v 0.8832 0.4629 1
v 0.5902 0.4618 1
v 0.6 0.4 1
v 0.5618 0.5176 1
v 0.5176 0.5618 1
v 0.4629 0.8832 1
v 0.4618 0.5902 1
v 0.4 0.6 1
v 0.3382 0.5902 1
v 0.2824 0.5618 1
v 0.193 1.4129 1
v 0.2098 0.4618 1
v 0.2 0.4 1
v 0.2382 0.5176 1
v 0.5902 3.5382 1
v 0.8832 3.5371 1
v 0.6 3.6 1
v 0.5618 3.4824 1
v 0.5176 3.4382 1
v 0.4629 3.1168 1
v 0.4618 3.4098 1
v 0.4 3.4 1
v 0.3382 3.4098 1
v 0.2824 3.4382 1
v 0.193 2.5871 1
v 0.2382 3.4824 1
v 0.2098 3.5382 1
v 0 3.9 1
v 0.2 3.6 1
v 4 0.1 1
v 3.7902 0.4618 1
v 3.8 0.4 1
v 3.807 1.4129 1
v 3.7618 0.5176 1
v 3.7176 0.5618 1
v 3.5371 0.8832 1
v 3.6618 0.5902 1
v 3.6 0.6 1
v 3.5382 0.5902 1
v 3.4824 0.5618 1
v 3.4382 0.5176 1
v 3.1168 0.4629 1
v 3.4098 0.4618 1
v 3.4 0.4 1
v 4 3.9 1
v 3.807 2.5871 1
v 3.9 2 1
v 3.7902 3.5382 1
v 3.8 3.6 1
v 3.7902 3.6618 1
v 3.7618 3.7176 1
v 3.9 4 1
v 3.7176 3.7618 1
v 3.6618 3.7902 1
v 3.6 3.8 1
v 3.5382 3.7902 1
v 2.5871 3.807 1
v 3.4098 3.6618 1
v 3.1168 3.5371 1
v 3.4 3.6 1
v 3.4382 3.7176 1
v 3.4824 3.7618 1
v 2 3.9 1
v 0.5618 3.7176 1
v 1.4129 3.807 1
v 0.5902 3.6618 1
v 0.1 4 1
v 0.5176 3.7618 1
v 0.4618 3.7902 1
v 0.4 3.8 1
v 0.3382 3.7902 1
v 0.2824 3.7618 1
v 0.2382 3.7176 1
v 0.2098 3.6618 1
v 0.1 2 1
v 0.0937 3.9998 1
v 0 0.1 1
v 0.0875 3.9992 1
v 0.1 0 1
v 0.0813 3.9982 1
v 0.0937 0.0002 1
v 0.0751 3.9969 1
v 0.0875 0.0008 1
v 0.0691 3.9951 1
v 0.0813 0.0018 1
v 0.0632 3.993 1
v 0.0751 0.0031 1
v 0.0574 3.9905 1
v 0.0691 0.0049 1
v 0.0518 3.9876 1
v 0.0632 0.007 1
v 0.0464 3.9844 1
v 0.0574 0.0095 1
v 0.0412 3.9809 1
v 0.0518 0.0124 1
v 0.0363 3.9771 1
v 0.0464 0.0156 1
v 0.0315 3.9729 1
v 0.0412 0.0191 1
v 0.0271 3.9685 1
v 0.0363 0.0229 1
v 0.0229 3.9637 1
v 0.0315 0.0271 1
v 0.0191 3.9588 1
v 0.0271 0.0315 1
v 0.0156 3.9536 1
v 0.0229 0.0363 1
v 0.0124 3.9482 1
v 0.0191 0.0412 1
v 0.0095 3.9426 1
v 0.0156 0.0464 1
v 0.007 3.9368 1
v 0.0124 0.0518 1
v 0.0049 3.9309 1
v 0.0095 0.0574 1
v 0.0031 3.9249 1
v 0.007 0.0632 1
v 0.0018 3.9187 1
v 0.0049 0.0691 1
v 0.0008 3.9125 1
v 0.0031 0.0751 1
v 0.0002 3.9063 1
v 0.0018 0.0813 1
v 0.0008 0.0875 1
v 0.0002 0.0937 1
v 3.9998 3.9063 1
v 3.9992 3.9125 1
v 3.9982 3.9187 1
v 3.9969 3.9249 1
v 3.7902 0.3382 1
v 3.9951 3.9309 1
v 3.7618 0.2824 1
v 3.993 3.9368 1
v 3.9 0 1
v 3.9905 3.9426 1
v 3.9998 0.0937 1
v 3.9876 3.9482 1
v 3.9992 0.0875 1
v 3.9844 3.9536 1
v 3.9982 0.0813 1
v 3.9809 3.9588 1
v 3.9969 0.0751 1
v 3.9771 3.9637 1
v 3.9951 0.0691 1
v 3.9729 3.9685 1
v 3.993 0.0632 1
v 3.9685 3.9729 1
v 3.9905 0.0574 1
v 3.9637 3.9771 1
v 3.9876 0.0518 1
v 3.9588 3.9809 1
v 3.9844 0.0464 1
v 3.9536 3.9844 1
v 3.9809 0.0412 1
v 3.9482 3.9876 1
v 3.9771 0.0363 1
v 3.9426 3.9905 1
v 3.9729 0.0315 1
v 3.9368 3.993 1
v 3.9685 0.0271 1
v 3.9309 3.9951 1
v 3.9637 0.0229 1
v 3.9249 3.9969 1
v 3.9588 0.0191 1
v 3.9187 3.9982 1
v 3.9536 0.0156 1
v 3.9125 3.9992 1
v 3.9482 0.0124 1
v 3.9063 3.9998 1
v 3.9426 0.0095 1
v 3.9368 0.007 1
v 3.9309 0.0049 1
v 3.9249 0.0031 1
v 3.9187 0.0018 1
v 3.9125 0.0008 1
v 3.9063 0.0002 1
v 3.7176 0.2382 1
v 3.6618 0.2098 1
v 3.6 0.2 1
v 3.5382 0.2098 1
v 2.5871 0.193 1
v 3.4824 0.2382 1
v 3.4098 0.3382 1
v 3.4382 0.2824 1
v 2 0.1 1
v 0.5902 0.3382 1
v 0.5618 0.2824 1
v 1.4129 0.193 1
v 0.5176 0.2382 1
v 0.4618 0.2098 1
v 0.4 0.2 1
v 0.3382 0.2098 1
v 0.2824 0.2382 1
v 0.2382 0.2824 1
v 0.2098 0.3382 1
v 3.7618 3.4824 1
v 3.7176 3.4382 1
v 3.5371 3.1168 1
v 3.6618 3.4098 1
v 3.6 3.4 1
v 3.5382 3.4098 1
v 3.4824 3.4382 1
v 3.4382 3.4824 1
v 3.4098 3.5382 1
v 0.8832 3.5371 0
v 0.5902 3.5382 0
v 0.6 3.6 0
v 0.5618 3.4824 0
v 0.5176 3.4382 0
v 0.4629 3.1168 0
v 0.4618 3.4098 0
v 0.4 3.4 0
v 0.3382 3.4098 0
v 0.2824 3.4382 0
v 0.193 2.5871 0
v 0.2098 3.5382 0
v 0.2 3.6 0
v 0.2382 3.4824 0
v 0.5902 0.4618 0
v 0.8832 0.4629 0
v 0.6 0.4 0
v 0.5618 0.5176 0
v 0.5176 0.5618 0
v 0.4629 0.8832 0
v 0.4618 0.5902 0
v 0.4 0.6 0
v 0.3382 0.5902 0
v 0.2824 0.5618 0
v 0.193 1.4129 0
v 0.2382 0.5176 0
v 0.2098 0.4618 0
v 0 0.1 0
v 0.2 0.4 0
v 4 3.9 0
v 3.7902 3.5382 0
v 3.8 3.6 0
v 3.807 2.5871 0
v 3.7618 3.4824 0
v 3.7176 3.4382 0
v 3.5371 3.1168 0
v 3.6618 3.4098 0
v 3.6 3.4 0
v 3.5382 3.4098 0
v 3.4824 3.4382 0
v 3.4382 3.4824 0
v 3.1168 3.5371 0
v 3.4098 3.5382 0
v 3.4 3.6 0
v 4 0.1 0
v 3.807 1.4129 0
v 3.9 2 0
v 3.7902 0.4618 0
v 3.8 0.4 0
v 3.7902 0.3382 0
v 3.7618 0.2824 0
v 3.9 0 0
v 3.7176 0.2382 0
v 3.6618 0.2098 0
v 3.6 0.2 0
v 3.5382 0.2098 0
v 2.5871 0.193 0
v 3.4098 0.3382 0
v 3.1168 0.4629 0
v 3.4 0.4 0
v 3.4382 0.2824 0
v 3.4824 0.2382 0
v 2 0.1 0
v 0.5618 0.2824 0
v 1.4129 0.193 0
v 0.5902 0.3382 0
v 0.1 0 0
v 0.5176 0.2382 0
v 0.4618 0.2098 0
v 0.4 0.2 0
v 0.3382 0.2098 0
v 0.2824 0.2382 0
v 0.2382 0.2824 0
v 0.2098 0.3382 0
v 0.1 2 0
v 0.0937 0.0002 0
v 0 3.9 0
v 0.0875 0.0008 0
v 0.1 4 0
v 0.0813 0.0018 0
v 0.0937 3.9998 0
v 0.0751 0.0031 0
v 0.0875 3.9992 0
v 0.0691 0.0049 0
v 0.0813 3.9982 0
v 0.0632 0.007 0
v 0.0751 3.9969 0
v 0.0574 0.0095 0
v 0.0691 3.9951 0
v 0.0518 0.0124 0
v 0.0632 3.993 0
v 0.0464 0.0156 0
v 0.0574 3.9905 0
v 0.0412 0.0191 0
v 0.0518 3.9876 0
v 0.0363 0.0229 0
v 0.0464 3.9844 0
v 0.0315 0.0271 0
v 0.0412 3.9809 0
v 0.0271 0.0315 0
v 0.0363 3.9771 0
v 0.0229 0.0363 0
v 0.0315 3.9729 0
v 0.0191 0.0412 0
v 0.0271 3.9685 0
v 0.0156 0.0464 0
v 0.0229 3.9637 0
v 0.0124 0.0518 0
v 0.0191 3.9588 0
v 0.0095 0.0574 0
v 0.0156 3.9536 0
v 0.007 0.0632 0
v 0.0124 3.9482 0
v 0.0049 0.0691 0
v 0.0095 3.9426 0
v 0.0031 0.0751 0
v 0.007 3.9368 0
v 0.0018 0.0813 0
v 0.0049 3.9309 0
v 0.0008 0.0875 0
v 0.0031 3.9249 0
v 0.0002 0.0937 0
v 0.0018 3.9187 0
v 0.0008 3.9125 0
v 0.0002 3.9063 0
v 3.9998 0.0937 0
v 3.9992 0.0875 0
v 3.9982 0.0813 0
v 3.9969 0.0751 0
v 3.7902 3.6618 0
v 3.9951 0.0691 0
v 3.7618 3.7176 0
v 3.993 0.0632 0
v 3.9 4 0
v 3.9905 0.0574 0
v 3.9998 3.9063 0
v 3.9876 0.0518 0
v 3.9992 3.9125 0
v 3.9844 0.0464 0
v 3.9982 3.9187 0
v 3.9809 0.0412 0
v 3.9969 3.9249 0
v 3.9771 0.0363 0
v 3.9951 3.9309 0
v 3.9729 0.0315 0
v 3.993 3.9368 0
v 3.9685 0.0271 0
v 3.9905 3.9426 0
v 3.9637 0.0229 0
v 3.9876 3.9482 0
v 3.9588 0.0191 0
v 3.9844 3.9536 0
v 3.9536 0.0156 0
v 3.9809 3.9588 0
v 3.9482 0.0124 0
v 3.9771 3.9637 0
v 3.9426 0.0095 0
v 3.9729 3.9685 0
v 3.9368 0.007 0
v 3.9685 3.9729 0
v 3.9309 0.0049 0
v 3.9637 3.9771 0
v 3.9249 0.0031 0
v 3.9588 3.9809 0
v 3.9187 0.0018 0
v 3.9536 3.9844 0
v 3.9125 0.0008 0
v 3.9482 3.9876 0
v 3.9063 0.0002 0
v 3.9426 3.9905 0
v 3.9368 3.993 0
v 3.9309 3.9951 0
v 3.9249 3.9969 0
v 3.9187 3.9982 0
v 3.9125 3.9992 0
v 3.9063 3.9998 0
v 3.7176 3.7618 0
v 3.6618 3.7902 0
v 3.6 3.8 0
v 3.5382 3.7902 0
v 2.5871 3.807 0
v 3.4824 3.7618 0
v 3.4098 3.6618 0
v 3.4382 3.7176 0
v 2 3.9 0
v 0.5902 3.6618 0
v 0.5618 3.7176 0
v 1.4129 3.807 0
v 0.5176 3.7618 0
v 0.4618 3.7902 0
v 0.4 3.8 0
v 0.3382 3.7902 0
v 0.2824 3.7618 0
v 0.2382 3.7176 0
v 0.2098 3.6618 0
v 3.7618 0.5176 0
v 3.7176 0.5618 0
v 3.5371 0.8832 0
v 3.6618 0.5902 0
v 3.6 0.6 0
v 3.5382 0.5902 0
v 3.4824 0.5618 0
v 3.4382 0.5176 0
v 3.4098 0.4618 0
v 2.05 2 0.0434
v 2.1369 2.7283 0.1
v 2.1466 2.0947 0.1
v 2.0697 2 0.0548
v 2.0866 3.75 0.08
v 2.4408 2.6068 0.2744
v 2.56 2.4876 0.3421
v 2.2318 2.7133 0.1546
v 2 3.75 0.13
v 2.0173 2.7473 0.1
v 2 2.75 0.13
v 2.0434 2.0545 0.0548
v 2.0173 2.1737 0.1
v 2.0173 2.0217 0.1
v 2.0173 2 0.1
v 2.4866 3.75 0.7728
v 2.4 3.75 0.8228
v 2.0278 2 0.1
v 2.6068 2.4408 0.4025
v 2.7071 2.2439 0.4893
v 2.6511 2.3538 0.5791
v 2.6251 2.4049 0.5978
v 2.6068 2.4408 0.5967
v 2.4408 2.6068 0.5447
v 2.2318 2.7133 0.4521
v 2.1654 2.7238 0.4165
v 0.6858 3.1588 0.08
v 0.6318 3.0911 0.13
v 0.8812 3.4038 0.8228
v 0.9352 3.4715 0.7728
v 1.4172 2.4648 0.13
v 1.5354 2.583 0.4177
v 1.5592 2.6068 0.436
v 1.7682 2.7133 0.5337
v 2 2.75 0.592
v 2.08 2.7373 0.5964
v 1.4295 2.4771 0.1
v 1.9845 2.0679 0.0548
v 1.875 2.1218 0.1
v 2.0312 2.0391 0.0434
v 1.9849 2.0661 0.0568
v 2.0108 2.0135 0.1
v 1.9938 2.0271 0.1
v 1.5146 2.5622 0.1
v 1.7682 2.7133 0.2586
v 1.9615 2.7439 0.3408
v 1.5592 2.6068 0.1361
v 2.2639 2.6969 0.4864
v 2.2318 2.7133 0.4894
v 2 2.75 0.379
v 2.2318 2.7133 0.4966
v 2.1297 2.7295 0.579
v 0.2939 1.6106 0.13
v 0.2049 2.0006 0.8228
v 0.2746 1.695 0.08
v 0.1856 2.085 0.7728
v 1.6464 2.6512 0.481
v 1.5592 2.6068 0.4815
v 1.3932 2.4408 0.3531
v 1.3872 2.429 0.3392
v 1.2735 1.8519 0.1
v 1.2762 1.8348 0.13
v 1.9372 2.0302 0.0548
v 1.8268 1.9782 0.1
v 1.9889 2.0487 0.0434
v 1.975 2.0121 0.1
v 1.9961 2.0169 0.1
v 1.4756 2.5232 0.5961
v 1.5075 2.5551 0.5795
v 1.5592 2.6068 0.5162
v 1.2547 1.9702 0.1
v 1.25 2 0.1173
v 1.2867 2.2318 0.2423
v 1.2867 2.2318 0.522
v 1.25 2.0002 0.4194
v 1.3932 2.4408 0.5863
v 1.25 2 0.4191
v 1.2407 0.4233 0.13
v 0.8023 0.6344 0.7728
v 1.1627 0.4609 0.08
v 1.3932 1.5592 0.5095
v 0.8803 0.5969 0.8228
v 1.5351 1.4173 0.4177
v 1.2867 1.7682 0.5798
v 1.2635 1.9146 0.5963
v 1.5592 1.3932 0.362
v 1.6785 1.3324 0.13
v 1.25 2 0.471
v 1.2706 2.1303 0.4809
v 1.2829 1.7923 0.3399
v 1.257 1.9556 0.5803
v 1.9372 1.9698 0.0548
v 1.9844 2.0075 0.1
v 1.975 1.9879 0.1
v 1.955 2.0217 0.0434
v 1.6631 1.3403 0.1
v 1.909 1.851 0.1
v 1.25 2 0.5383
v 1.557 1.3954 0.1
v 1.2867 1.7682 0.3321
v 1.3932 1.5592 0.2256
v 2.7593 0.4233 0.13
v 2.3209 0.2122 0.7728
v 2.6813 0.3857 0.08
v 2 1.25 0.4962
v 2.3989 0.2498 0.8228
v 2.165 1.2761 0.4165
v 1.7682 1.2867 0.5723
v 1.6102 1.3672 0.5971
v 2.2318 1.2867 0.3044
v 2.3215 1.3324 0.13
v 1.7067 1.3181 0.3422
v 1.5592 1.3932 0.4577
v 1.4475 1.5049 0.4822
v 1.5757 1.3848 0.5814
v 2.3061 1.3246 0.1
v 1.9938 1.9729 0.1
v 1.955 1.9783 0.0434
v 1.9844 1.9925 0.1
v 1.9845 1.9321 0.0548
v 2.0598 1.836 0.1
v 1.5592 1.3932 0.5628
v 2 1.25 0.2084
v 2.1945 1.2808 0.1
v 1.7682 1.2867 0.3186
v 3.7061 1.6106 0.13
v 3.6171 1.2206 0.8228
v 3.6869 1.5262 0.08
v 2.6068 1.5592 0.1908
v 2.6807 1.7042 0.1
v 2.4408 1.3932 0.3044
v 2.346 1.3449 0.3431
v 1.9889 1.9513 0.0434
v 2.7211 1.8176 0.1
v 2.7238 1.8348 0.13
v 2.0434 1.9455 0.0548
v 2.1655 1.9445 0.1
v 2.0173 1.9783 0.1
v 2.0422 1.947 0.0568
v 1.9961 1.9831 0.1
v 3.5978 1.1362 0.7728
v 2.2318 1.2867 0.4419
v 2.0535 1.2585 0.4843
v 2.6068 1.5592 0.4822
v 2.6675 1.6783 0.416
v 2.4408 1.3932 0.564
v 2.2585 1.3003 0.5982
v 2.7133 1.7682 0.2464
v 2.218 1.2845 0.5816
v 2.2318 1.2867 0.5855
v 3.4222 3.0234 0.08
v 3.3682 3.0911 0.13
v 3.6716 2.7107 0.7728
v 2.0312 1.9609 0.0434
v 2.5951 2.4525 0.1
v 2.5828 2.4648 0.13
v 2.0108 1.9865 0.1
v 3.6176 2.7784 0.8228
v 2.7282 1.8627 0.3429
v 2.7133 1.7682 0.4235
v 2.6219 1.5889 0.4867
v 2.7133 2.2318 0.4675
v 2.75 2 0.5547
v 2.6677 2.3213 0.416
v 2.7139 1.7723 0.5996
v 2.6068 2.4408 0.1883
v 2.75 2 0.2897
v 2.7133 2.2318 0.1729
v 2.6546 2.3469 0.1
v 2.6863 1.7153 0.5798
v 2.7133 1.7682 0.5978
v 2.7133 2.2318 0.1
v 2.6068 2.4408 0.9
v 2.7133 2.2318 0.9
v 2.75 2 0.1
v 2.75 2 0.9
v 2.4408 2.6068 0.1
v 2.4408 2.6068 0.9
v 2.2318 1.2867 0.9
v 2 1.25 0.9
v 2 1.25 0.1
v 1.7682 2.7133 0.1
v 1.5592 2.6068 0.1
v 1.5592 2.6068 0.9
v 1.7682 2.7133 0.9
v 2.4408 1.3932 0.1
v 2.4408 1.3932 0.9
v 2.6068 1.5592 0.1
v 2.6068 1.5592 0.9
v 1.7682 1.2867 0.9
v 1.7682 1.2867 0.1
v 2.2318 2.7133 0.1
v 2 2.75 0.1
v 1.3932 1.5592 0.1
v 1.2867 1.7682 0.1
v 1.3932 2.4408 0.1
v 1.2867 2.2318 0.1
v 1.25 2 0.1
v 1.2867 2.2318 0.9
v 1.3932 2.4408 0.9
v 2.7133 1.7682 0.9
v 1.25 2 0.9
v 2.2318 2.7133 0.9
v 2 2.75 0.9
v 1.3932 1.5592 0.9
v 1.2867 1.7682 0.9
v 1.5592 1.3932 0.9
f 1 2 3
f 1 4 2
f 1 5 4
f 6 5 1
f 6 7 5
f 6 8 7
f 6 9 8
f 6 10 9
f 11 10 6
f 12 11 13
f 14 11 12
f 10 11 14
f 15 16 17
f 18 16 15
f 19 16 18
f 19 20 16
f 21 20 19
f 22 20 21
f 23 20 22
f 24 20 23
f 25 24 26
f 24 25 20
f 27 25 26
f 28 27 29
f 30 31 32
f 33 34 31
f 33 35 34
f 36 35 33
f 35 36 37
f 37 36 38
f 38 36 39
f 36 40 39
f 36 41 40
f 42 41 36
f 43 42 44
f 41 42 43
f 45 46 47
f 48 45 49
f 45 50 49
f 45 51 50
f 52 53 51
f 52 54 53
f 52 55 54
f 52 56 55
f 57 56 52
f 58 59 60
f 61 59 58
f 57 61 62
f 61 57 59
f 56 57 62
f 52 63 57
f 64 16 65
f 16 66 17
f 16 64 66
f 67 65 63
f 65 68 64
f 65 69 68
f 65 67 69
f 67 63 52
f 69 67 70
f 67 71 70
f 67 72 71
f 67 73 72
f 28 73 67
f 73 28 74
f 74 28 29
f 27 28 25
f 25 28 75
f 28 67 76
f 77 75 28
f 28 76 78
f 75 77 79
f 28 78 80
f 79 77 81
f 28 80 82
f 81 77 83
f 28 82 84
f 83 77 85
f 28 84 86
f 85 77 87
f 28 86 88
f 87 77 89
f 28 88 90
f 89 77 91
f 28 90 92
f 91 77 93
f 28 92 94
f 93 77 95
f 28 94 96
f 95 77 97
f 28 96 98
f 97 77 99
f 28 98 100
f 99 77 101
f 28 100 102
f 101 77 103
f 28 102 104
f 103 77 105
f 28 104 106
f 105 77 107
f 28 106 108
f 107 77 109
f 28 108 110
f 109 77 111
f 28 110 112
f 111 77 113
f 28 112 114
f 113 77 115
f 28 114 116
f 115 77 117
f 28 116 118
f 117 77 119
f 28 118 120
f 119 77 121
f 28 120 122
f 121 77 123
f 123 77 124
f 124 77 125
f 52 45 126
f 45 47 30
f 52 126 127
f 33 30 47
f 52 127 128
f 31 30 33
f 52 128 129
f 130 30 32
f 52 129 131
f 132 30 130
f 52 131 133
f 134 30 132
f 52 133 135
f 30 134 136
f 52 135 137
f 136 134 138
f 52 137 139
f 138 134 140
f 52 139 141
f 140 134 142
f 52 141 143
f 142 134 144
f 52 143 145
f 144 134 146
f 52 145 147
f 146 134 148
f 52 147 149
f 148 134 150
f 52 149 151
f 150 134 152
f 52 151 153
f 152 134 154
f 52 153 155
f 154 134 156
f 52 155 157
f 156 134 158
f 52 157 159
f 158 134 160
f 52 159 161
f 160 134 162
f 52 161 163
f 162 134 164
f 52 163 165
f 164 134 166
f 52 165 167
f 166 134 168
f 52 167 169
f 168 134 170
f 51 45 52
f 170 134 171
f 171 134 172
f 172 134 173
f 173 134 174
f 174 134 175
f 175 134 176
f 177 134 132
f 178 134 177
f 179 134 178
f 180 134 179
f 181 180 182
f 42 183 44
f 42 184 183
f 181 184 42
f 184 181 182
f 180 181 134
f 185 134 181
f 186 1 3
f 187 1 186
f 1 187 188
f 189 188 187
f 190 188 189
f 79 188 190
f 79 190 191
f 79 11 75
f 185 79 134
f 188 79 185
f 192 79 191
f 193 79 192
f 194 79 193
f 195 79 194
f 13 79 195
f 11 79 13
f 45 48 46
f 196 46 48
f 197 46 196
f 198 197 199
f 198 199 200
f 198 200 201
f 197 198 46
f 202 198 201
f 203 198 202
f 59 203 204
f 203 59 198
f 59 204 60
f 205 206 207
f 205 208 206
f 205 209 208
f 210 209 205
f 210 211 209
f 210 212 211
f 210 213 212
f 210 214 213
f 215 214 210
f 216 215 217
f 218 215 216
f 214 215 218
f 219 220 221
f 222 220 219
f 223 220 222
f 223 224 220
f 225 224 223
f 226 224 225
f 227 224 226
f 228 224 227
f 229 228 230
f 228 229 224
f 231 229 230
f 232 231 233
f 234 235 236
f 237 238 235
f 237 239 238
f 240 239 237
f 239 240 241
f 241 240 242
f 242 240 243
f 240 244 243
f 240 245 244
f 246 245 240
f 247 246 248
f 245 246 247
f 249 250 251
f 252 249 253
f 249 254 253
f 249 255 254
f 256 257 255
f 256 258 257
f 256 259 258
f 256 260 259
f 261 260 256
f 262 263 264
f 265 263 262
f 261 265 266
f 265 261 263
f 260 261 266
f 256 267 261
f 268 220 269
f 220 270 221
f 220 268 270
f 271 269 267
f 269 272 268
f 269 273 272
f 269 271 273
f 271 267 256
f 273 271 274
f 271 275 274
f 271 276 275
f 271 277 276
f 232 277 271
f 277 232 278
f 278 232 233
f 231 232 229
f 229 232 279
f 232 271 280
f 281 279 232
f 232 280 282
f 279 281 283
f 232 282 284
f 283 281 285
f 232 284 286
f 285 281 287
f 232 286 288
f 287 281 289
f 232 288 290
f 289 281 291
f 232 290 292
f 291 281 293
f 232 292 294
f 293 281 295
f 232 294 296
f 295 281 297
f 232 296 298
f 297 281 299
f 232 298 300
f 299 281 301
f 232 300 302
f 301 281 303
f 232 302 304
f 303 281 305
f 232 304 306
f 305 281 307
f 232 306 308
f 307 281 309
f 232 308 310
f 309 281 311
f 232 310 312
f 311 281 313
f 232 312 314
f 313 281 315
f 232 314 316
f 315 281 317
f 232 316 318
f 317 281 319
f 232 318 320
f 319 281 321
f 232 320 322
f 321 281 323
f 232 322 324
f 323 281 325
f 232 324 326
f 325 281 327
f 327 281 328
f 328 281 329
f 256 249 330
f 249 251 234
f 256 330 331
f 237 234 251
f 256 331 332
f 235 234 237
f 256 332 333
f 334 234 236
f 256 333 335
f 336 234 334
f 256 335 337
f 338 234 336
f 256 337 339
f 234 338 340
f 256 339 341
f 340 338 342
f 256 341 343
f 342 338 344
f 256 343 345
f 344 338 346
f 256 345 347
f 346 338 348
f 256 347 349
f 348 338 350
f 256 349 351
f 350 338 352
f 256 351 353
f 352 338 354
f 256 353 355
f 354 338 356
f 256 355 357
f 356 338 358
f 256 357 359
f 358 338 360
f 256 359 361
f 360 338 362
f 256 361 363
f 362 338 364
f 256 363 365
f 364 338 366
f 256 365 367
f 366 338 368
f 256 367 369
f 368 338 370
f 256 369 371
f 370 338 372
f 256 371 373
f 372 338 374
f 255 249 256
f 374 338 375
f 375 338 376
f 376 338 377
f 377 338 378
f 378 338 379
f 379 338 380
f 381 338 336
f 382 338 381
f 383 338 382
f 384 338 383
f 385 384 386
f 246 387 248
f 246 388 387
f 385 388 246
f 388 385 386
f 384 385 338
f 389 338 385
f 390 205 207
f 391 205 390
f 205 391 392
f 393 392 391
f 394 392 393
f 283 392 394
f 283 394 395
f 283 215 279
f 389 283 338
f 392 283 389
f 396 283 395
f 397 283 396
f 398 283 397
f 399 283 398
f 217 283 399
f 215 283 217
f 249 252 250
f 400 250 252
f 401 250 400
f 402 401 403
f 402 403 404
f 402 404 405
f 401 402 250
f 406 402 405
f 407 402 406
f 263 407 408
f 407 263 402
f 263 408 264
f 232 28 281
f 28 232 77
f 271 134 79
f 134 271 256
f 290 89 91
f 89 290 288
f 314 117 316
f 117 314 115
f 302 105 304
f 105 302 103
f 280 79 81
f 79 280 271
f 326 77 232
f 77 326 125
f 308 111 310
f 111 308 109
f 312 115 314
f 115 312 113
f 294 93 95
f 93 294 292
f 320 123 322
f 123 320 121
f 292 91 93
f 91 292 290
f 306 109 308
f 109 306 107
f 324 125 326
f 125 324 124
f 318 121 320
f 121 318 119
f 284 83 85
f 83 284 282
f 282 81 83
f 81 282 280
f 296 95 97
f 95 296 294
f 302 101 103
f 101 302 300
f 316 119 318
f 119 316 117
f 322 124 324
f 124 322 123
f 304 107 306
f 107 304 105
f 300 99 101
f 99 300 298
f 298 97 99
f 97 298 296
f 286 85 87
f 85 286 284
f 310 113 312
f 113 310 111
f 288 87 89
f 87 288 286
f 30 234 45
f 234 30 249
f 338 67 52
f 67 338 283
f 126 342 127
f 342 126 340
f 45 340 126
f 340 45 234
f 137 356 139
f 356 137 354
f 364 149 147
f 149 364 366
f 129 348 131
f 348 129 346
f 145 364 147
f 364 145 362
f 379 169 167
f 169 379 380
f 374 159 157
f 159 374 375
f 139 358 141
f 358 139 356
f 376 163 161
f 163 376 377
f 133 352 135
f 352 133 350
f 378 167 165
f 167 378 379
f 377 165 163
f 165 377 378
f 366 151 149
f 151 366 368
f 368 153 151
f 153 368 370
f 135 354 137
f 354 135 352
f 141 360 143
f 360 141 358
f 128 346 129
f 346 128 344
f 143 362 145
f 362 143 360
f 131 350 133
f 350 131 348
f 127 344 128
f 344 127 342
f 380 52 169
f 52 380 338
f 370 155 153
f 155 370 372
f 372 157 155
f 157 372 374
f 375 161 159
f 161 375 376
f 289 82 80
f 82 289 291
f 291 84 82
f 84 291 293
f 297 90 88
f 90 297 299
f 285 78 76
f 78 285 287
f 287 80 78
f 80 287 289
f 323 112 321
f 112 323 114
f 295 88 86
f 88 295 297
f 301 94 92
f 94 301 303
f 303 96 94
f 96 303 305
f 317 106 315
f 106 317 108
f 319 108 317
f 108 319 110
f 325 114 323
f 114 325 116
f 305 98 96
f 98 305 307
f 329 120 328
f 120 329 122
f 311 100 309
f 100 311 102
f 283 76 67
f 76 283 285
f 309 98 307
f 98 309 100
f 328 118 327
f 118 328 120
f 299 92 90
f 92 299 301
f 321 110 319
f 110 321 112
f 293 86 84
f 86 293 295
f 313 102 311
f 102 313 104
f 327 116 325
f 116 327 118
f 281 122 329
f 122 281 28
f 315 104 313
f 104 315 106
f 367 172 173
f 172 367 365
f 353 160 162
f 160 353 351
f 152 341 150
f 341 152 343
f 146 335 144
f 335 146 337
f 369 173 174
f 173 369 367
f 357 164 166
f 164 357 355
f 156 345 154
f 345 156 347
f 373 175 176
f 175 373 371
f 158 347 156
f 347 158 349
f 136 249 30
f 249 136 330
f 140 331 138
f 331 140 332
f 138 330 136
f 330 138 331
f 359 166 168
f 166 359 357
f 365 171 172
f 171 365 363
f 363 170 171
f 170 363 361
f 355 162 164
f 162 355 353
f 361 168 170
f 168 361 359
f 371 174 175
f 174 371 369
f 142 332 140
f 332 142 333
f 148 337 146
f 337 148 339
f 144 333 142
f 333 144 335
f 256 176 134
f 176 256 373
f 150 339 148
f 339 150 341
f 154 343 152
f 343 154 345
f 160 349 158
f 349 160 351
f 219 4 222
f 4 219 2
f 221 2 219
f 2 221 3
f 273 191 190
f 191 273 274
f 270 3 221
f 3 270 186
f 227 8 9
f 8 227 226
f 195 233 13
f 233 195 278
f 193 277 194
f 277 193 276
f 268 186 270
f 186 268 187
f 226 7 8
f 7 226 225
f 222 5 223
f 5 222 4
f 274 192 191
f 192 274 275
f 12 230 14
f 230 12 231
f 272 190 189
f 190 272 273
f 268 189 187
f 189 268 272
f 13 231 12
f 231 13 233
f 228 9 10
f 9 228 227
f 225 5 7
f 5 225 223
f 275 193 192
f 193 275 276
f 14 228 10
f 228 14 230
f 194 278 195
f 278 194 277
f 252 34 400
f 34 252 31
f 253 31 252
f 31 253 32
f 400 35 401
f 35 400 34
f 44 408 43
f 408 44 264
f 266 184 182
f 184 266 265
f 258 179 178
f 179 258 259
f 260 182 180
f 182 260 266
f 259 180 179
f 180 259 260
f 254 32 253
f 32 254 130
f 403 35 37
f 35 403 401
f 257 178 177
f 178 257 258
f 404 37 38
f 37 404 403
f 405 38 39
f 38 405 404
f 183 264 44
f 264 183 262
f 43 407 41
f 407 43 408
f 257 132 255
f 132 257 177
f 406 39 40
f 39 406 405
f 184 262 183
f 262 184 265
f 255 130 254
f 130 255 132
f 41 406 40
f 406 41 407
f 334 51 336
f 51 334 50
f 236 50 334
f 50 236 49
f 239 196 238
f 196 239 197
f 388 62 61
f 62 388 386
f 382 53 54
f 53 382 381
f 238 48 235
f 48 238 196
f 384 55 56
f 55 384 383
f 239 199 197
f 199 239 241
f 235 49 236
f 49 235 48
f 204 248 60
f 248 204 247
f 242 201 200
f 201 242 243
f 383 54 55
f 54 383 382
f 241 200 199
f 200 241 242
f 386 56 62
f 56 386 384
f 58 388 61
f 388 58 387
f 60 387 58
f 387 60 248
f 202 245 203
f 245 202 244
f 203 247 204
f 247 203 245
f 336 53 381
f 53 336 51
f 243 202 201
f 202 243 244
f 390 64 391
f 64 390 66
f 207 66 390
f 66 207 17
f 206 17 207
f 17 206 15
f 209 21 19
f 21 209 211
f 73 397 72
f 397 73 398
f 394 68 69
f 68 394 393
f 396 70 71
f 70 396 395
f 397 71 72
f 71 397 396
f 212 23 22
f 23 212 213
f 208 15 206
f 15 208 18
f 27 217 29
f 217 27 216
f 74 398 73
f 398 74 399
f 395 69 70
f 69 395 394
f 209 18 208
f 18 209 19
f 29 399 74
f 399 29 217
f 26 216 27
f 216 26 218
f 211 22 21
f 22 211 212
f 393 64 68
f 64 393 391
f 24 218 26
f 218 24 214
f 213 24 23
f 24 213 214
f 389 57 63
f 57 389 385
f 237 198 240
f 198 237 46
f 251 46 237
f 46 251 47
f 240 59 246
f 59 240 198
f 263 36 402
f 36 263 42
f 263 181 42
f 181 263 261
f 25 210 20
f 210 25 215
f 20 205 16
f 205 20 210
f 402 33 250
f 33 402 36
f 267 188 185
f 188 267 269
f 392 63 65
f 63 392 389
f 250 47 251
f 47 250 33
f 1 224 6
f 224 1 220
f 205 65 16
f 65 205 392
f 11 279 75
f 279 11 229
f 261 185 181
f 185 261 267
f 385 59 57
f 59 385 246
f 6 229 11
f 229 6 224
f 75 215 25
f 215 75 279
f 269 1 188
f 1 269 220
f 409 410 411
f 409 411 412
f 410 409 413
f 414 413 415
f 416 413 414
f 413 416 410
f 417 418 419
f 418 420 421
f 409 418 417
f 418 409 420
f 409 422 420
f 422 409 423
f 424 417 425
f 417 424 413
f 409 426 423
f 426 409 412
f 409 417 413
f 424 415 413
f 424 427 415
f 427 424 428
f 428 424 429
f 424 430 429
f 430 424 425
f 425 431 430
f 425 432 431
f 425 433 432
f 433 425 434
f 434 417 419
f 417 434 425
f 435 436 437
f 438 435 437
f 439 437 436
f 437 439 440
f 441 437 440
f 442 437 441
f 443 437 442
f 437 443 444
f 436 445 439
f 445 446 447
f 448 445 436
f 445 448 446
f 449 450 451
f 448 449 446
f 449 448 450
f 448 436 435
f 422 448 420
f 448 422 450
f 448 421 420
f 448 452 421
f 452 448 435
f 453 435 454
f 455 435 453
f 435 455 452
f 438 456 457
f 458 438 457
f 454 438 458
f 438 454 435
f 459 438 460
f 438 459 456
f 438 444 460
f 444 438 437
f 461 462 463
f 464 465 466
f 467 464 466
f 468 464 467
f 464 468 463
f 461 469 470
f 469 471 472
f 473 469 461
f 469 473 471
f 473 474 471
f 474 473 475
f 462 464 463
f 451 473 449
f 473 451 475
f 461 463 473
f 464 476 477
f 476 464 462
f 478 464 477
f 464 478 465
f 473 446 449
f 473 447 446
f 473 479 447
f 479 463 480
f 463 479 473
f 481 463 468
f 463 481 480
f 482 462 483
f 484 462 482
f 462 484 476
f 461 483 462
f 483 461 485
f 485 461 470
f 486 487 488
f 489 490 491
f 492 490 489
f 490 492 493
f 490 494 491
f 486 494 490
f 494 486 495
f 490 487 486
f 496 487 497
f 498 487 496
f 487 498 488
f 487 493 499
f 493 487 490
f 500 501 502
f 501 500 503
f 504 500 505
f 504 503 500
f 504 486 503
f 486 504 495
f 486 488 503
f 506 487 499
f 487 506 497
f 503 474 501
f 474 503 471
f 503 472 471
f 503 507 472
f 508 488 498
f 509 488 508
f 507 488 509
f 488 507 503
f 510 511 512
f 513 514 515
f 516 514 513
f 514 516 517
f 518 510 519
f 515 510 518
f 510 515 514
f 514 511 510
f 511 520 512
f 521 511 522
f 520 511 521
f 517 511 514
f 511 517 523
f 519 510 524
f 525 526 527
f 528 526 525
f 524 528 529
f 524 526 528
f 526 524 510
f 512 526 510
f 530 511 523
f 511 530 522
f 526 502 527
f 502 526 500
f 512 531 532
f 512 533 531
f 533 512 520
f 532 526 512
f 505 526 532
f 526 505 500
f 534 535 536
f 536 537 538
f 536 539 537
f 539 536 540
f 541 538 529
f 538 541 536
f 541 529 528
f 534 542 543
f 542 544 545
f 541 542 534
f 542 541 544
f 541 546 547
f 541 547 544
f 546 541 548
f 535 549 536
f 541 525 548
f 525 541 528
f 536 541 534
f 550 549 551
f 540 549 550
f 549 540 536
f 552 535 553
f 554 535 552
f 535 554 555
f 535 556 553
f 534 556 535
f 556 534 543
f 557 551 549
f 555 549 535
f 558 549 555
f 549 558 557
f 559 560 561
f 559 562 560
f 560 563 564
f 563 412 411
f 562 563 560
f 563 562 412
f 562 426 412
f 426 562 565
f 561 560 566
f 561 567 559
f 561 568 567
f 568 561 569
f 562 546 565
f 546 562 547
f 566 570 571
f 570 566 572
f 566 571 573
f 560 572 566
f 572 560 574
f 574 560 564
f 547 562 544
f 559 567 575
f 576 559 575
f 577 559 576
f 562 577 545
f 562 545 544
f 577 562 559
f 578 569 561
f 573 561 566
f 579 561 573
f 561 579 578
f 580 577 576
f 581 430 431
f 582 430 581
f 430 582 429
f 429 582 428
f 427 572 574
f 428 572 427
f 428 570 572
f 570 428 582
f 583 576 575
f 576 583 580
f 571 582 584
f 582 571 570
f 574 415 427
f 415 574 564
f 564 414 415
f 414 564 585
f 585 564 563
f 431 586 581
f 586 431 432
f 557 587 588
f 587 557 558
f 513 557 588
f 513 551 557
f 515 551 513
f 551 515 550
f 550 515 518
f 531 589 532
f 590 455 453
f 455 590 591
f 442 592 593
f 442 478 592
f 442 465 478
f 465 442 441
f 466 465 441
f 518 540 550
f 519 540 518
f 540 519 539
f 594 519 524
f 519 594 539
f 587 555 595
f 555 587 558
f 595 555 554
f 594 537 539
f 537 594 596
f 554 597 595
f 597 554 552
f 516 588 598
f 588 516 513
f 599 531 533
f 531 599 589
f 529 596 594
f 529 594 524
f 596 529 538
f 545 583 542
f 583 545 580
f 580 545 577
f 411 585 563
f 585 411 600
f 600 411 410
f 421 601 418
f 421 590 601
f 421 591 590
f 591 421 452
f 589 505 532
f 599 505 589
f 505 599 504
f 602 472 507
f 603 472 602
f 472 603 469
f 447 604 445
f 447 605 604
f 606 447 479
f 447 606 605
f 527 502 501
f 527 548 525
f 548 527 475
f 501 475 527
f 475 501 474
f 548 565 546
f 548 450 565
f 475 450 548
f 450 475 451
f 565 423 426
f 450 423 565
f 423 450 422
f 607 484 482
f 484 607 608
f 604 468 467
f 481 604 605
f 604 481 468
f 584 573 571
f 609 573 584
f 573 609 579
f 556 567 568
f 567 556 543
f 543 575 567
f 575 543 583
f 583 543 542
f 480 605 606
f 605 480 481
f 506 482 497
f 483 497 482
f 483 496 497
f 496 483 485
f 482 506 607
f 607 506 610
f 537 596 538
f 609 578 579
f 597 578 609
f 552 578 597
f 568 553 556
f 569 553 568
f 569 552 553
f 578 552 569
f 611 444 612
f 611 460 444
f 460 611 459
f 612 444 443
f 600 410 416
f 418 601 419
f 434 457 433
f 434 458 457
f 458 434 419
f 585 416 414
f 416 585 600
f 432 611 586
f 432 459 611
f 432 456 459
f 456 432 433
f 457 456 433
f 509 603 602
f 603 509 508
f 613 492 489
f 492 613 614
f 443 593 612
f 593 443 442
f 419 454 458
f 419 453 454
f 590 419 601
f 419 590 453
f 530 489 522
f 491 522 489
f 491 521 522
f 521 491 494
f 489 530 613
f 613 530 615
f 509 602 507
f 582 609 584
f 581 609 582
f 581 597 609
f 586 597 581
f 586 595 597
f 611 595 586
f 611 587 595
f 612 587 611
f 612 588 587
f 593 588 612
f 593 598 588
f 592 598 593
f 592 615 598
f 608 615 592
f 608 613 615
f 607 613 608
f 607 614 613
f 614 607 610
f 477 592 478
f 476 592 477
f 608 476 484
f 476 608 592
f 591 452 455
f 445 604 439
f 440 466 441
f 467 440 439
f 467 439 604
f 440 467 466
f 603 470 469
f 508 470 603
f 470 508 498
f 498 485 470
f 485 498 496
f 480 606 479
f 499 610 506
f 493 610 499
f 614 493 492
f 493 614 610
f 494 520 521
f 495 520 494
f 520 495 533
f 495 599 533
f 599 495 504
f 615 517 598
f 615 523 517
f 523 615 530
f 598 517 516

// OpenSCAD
// file: include.scad
//$fs = 0.05;
$fn = 100;
//$fa = 20;

OVERLAP = 0.1;

module rounded_cuboid(dimensions, CORNER_R) {
    
    MB_L = dimensions[0];
    MB_W = dimensions[1];
    MB_H = dimensions[2];
    
    difference() {
        cube([MB_L, MB_W, MB_H]);
        difference() {
            translate([0,0,0])                              { cube([CORNER_R, CORNER_R, MB_H]);}
            translate([CORNER_R,CORNER_R,0])                { cylinder(h = MB_H, r = CORNER_R, $fs = 0.1);}
        }
        difference() {
            translate([MB_L-CORNER_R,MB_W-CORNER_R,0])      { cube([CORNER_R, CORNER_R, MB_H+1]);}
            translate([MB_L - CORNER_R,MB_W - CORNER_R,0])  { cylinder(h = MB_H, r = CORNER_R, $fs = 0.1);}
        }
        difference() {
            translate([0,MB_W-CORNER_R,0])                  { cube([CORNER_R, CORNER_R, MB_H+1]);}
            translate([CORNER_R,MB_W - CORNER_R,0])         { cylinder(h = MB_H, r = CORNER_R, $fs = 0.1);}
        }
        difference() {
            translate([MB_L-CORNER_R,0,0])                  { cube([CORNER_R, CORNER_R, MB_H+1]);}
            translate([MB_L - CORNER_R,CORNER_R,0])         { cylinder(h = MB_H, r = CORNER_R, $fs = 0.1);}
        }
    }
}
// main file
use <include.scad>


FAN_SIZE  = 4.0;
FAN_DEPTH = 1.0;
CORNER_R = 0.1;



module fan40() {



    difference() {
        rounded_cuboid([FAN_SIZE, FAN_SIZE, FAN_DEPTH], CORNER_R);
        
        // screw holes
        MOUNT_HOLE_SPACING = 3.2;
        SCREW_SHIFT = (FAN_SIZE - MOUNT_HOLE_SPACING) / 2;
        SCREW_HOLE_R = 0.2; // radius of screw holes - centered on rounded corners centers
    
        translate([SCREW_SHIFT, SCREW_SHIFT,0])               { cylinder(h = FAN_DEPTH, r = SCREW_HOLE_R, $fn = 20); }
        translate([FAN_SIZE - SCREW_SHIFT, SCREW_SHIFT,0])  { cylinder(h = FAN_DEPTH, r = SCREW_HOLE_R, $fn = 20); }
        translate([FAN_SIZE - SCREW_SHIFT, FAN_SIZE - SCREW_SHIFT,0]) { cylinder(h = FAN_DEPTH, r = SCREW_HOLE_R, $fn = 20); }
        translate([SCREW_SHIFT, FAN_SIZE - SCREW_SHIFT,0])        { cylinder(h = FAN_DEPTH, r = SCREW_HOLE_R, $fn = 20); }
        
        // fan hole
        FAN_HOLE_R = (FAN_SIZE / 2) - 0.1;
        translate([FAN_SIZE / 2, FAN_SIZE / 2, 0]) {
            cylinder(h = FAN_DEPTH, r = FAN_HOLE_R, $fn = 20);
        }
    }
    
    
    //fan center with blades 
    FAN_CENTER_R = 0.75;
    FAN_CENTER_H = FAN_DEPTH - 0.2;
    BLADE_LENGTH = 1.75;
    BLADE_WIDTH = FAN_CENTER_H;
    BLADE_THICKNESS = 0.1;
    BLADES_NUMB = 7;
    
    translate([FAN_SIZE / 2, FAN_SIZE / 2, (FAN_DEPTH - FAN_CENTER_H) / 2]) {
        cylinder(h = FAN_CENTER_H, r = FAN_CENTER_R, $fn = 20);
        for ( angle = [0 : 360/BLADES_NUMB: 360]) {
            rotate([0, 0, angle]) {
                translate([0,  (BLADE_LENGTH / 2), 0.03]) {
                
                // single blade
                rotate([90, 30, 0]) {
                    linear_extrude(height = BLADE_LENGTH, center = true, convexity = 10, twist = 30) {
                        square([BLADE_THICKNESS, BLADE_WIDTH]);
                    }
                }}
            }
        }
    }
}

fan40();
